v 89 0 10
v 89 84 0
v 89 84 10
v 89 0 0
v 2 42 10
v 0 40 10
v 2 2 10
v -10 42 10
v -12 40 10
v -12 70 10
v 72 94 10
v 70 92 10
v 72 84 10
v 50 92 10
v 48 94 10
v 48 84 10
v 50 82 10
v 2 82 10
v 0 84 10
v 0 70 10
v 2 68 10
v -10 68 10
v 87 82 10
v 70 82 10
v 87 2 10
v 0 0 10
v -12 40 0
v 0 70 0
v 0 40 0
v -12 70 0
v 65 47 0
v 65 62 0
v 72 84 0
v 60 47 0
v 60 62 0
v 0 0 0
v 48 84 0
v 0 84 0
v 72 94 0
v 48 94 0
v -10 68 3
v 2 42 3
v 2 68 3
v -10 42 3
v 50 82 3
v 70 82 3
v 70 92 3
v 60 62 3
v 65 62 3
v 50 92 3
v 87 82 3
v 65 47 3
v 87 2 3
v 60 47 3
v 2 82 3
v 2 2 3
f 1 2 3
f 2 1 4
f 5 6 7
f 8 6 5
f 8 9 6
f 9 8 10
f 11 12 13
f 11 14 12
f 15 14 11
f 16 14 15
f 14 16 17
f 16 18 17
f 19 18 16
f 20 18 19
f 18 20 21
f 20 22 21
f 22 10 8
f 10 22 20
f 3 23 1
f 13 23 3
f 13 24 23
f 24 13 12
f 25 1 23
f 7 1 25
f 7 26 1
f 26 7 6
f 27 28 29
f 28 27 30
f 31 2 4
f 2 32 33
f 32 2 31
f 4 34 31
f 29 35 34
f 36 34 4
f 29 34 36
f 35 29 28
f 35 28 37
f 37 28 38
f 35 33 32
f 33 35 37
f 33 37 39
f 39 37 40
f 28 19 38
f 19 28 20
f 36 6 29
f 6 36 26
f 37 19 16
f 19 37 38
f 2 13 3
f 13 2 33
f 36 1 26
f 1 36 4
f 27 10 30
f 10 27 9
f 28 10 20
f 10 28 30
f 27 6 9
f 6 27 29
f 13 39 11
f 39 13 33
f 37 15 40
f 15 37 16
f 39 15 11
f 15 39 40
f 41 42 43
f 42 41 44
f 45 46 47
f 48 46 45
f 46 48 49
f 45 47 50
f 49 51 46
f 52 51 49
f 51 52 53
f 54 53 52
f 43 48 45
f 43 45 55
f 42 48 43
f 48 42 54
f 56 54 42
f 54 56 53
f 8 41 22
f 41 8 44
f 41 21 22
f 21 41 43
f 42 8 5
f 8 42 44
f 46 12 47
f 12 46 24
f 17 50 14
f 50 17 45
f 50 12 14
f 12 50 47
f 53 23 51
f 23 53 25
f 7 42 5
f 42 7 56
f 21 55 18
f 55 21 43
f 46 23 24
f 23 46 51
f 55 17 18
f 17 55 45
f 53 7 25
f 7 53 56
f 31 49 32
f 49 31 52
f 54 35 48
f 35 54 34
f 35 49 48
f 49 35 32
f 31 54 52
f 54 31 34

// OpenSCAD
difference() {
    union() {
        cube([89, 84, 10]);
        
        translate([-12, 40, 0]) {
            cube([20, 30, 10]);
        }
        
        translate([48, 82, 0]) {
            cube([24, 12, 10]);
        }
    }
    
    translate([-10, 42, 3]) {
        cube([20, 26, 30]);
    }
    translate([50, 80, 3]) {
        cube([20, 12, 10]);
    }
    
    translate([2,2,3]) {
        cube([85, 80, 30]);
    }
    translate([60,47,-10]){
        cube([5,15,30]);
    }
}
